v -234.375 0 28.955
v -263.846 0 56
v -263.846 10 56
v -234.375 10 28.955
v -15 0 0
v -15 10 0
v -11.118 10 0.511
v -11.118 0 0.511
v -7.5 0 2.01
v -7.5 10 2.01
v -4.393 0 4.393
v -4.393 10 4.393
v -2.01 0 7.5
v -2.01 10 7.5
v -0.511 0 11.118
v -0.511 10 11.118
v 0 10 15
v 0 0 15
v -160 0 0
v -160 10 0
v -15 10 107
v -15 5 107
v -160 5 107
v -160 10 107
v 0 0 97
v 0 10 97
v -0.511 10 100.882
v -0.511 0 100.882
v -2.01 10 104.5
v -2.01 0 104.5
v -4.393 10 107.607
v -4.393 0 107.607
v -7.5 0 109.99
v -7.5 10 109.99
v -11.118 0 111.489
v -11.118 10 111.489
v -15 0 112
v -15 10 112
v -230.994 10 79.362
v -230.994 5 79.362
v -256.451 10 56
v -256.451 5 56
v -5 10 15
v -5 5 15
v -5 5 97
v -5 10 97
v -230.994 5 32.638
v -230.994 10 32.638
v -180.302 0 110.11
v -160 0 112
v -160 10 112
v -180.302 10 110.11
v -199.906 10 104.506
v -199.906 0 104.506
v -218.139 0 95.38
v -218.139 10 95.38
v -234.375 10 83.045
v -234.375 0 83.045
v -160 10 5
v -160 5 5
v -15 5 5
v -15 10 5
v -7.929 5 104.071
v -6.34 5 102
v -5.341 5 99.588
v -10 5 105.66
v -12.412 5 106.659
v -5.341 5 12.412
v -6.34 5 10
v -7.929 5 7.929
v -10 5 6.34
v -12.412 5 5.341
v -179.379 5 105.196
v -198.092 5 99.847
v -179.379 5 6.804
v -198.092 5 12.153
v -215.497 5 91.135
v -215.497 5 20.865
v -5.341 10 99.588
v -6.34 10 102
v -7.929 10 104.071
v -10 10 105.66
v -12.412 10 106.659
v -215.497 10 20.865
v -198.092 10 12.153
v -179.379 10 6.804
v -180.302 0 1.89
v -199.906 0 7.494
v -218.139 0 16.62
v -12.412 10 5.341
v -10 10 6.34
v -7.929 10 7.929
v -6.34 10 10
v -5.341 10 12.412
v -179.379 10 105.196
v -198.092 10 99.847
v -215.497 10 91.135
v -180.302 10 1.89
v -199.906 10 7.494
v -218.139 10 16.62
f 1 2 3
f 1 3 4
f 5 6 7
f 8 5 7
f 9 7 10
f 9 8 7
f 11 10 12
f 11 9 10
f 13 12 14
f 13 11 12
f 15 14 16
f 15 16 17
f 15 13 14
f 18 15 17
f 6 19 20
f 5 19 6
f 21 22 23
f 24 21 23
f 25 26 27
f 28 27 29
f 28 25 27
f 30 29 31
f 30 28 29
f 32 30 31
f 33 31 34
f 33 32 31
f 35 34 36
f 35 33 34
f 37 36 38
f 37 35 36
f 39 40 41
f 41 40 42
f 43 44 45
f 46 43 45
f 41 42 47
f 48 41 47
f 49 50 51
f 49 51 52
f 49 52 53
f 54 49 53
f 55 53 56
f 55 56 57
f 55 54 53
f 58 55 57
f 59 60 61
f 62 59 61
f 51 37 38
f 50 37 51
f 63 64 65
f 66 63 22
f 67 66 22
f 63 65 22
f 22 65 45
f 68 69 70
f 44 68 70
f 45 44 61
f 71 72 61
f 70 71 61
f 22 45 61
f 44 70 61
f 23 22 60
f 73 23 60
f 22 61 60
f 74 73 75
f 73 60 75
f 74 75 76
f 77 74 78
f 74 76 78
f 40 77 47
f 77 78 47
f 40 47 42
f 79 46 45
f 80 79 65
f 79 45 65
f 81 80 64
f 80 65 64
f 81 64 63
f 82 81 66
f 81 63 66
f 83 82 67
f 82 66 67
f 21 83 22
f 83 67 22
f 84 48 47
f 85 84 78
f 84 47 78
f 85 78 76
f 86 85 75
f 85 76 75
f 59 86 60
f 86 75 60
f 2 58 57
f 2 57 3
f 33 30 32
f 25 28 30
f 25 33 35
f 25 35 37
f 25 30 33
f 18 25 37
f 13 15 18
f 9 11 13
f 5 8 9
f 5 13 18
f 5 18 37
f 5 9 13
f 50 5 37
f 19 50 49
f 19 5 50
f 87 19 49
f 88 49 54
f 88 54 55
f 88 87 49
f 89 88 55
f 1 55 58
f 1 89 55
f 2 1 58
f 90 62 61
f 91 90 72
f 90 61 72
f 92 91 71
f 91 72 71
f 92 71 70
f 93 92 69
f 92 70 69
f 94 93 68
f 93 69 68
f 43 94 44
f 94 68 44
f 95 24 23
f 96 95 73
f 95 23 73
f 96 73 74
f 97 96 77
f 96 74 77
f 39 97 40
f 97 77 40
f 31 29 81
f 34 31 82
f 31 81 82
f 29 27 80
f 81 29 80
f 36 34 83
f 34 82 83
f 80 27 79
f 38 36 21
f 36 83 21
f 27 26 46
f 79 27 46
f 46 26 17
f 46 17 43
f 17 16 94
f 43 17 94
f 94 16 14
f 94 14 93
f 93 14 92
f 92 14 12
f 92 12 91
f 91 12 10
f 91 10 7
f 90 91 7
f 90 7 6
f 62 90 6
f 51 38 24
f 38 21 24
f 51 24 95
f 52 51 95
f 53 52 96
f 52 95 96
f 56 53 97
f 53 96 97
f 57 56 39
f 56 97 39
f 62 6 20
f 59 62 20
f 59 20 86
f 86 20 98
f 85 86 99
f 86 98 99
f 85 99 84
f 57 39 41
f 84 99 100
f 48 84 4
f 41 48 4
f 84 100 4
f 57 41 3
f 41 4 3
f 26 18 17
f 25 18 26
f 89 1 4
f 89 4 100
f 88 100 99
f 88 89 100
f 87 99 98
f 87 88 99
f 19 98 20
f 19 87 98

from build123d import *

# Parameters (mm, degrees)
BOSS_EXTRUDE1_DEPTH = 10
SHELL1_T            = -5


with BuildPart() as part:
    # Sketch1 → Boss-Extrude1 (new body)
    with BuildSketch(Plane(origin=(0, 0, 0), x_dir=(1, 0, 0), z_dir=(0, 1, 0))):
        with BuildLine():
            Line((0, -15), (0, -97))
            ThreePointArc((0, -97), (-4.393398282, -107.606601718), (-15, -112))
            Line((-15, -112), (-160, -112))
            ThreePointArc((-160, -112), (-199.906147513, -104.506094408), (-234.374969534, -83.045443467))
            Line((-234.374969534, -83.045443467), (-263.846039886, -56))
            Line((-263.846039886, -56), (-234.374969534, -28.954556533))
            ThreePointArc((-234.374969534, -28.954556533), (-199.906147513, -7.493905592), (-160, 0))
            Line((-160, 0), (-15, 0))
            ThreePointArc((-15, 0), (-4.393398282, -4.393398282), (0, -15))
        make_face()
    extrude(amount=BOSS_EXTRUDE1_DEPTH)

    # Shell1
    shell1_openings = [part.faces().sort_by_distance(p)[0] for p in [
        (-116.342811862, 10, 56),
    ]]
    offset(amount=SHELL1_T, openings=shell1_openings, kind=Kind.INTERSECTION)


solid = part.part
